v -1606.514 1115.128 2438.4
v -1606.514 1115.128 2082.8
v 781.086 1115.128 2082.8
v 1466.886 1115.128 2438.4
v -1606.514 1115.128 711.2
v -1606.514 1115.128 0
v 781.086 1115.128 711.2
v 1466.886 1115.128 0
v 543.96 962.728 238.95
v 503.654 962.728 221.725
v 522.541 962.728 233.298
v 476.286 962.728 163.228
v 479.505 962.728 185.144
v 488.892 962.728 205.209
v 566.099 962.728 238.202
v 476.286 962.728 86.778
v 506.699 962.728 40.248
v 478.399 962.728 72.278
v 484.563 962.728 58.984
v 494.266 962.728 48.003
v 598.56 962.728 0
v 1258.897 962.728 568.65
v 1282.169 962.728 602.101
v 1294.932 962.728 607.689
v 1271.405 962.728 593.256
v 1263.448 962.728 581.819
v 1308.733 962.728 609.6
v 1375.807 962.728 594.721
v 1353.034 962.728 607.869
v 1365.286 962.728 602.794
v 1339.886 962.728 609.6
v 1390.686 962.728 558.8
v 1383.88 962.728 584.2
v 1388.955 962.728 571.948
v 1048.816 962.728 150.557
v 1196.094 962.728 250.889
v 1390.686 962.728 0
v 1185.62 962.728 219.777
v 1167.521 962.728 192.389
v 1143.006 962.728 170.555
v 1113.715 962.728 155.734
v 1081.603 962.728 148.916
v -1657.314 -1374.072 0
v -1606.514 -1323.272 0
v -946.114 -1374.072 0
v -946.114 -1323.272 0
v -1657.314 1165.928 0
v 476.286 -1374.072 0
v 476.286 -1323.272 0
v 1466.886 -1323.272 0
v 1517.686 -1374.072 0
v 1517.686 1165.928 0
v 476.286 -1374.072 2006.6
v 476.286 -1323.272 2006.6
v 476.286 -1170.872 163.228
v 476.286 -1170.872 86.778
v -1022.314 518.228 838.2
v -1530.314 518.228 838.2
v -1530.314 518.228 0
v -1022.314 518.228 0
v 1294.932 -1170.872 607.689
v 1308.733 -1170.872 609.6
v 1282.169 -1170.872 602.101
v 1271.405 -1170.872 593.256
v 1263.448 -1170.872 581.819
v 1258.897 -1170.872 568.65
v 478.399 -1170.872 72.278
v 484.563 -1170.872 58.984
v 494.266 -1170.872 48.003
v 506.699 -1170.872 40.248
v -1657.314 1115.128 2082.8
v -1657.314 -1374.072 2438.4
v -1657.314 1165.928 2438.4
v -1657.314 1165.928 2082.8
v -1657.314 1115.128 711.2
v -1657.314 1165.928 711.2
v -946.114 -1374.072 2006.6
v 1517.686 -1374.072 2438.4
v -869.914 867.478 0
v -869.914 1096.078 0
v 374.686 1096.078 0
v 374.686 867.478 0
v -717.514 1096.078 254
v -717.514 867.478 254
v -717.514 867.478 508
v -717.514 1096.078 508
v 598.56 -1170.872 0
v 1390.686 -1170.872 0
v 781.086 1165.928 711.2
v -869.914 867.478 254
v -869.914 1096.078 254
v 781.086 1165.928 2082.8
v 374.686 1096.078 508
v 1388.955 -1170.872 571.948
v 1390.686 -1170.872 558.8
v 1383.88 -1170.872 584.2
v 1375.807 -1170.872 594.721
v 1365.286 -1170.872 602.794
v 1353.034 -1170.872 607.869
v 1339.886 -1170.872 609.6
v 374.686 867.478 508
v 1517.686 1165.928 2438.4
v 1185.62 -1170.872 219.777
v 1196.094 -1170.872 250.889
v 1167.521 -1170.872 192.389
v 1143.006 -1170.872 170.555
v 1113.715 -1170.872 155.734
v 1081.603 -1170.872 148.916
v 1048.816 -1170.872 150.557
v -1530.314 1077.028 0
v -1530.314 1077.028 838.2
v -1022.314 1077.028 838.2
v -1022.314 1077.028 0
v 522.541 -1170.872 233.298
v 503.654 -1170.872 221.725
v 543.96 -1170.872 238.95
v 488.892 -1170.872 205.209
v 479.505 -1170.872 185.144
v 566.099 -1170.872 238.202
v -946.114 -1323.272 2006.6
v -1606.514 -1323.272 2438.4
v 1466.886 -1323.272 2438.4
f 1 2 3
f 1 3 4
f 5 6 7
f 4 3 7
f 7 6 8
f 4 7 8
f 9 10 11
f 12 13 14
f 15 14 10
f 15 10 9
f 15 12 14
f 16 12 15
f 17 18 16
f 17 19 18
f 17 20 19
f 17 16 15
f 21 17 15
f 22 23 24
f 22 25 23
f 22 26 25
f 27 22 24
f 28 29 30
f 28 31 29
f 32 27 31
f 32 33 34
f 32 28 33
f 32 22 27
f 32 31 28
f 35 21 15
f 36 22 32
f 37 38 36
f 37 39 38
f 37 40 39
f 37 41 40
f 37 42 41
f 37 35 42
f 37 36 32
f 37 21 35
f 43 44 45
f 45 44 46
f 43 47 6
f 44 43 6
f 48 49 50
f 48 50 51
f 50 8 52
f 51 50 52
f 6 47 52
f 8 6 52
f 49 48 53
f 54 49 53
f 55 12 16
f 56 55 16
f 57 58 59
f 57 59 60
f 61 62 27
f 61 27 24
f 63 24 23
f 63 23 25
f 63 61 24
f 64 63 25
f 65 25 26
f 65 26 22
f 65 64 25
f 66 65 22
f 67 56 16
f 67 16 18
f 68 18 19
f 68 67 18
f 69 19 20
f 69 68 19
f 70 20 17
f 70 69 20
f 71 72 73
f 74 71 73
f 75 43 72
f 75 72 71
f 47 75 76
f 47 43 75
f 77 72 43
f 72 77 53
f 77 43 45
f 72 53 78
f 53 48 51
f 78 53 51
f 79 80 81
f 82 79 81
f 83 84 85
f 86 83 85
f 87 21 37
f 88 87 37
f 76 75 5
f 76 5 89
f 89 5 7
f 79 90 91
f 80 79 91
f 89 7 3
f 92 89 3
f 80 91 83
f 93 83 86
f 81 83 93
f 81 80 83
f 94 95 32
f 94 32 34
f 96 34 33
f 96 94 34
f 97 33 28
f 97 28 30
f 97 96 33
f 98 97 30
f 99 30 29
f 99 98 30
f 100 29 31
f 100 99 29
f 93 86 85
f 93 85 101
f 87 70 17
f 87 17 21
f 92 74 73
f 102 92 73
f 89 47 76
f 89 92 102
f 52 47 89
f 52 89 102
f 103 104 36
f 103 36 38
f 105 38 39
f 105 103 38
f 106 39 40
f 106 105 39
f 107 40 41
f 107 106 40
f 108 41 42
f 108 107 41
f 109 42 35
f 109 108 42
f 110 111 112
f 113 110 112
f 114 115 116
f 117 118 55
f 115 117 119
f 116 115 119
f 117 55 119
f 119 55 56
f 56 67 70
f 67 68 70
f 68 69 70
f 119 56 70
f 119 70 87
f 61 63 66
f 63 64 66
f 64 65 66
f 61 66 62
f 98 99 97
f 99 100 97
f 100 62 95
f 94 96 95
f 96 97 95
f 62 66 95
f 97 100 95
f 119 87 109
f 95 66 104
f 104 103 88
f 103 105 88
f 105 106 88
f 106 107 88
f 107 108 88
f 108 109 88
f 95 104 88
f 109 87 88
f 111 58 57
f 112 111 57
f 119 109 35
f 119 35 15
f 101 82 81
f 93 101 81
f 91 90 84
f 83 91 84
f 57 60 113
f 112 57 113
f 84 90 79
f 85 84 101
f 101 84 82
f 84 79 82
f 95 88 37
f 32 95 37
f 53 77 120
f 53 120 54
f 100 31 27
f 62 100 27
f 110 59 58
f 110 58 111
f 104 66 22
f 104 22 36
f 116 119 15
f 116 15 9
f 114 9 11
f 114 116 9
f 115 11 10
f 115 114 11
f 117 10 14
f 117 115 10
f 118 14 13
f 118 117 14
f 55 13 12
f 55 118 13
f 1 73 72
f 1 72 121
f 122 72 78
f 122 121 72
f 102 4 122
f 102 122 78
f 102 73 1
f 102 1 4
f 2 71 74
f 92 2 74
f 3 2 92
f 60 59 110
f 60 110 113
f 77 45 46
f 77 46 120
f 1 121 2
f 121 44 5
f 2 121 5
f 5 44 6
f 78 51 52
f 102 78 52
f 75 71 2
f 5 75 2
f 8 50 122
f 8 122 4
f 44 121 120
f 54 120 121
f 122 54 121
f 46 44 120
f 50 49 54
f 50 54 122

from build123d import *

# Parameters (mm, degrees)
F0_W      = 3175
F0_H      = 2540
F0_W_2    = 3073.4
F0_H_2    = 2438.4
F1_DEPTH  = 2438.4
F2_W      = 1422.4
F2_H      = 2006.6
F3_DEPTH  = 50.8
F4_W      = 2438.4
F4_H      = 1371.6
F5_DEPTH  = 50.8
F6_W      = 1244.6
F6_H      = 228.6
F7_DEPTH  = 508
F8_W      = 508
F8_H      = 558.8
F9_DEPTH  = 838.2
F10_W     = 152.4
F10_H     = 254
F11_DEPTH = 228.6
F12_W     = 914.4
F12_H     = 2133.6
F13_DEPTH = 609.6
F15_DEPTH = 2133.6


with BuildPart() as f1:
    # F0 (on Top) → F1 (new body)
    with BuildSketch(Plane.XY):
        with Locations((-69.814301, -104.071956)):
            Rectangle(F0_W, F0_H)
        with Locations((-69.814301, -104.071956)):
            Rectangle(F0_W_2, F0_H_2, mode=Mode.SUBTRACT)
    extrude(amount=F1_DEPTH)

    # F2 (on face) → F3 (cut, through all)
    with BuildSketch(Plane.XZ.offset(1374.071956)):
        with Locations((-234.914301, 1003.3)):
            Rectangle(F2_W, F2_H)
    extrude(amount=-F3_DEPTH, mode=Mode.SUBTRACT)

    # F4 (on face) → F5 (cut, through all)
    with BuildSketch(Plane.XZ.offset(-1115.128044)):
        with Locations((-438.114301, 1397)):
            Rectangle(F4_W, F4_H)
    extrude(amount=-F5_DEPTH, mode=Mode.SUBTRACT)


with BuildPart() as f7:
    # F6 (on Top) → F7 (new body)
    with BuildSketch(Plane.XY):
        with Locations((-247.614301, 981.778044)):
            Rectangle(F6_W, F6_H)
    extrude(amount=F7_DEPTH)

    # F10 (on face) → F11 (cut, through all)
    with BuildSketch(Plane.XZ.offset(-867.478044)):
        with Locations((-793.714301, 381)):
            Rectangle(F10_W, F10_H)
    extrude(amount=-F11_DEPTH, mode=Mode.SUBTRACT)


with BuildPart() as f9:
    # F8 (on Top) → F9 (new body)
    with BuildSketch(Plane.XY):
        with Locations((-1276.314301, 797.628044)):
            Rectangle(F8_W, F8_H)
    extrude(amount=F9_DEPTH)


with BuildPart() as f13:
    # F12 (on Top) → F13 (new body)
    with BuildSketch(Plane.XY):
        with Locations((933.485699, -104.071956)):
            Rectangle(F12_W, F12_H)
    extrude(amount=F13_DEPTH)

    # F14 (on face) → F15 (intersect, through all)
    with BuildSketch(Plane.XZ.offset(1170.871956)):
        with BuildLine():
            ThreePointArc((1308.73337, 609.6), (1276.482252, 598.049273), (1258.897428, 568.649819))
            Line((1258.897428, 568.649819), (1196.093633, 250.889042))
            ThreePointArc((1196.093633, 250.889042), (1143.006498, 170.554735), (1048.815629, 150.556607))
            Line((1048.815629, 150.556607), (566.09859, 238.202422))
            ThreePointArc((566.09859, 238.202422), (503.653652, 221.724993), (476.285699, 163.228232))
            Line((476.285699, 163.228232), (476.285699, 86.777865))
            ThreePointArc((476.285699, 86.777865), (484.563488, 58.983953), (506.699145, 40.247999))
            Line((506.699145, 40.247999), (598.560375, 0))
            Line((598.560375, 0), (1390.685699, 0))
            Line((1390.685699, 0), (1390.685699, 558.8))
            ThreePointArc((1390.685699, 558.8), (1375.806724, 594.721024), (1339.885699, 609.6))
            Line((1339.885699, 609.6), (1308.73337, 609.6))
        make_face()
    extrude(amount=-F15_DEPTH, mode=Mode.INTERSECT)


solid = Compound([f1.part, f7.part, f9.part, f13.part])
